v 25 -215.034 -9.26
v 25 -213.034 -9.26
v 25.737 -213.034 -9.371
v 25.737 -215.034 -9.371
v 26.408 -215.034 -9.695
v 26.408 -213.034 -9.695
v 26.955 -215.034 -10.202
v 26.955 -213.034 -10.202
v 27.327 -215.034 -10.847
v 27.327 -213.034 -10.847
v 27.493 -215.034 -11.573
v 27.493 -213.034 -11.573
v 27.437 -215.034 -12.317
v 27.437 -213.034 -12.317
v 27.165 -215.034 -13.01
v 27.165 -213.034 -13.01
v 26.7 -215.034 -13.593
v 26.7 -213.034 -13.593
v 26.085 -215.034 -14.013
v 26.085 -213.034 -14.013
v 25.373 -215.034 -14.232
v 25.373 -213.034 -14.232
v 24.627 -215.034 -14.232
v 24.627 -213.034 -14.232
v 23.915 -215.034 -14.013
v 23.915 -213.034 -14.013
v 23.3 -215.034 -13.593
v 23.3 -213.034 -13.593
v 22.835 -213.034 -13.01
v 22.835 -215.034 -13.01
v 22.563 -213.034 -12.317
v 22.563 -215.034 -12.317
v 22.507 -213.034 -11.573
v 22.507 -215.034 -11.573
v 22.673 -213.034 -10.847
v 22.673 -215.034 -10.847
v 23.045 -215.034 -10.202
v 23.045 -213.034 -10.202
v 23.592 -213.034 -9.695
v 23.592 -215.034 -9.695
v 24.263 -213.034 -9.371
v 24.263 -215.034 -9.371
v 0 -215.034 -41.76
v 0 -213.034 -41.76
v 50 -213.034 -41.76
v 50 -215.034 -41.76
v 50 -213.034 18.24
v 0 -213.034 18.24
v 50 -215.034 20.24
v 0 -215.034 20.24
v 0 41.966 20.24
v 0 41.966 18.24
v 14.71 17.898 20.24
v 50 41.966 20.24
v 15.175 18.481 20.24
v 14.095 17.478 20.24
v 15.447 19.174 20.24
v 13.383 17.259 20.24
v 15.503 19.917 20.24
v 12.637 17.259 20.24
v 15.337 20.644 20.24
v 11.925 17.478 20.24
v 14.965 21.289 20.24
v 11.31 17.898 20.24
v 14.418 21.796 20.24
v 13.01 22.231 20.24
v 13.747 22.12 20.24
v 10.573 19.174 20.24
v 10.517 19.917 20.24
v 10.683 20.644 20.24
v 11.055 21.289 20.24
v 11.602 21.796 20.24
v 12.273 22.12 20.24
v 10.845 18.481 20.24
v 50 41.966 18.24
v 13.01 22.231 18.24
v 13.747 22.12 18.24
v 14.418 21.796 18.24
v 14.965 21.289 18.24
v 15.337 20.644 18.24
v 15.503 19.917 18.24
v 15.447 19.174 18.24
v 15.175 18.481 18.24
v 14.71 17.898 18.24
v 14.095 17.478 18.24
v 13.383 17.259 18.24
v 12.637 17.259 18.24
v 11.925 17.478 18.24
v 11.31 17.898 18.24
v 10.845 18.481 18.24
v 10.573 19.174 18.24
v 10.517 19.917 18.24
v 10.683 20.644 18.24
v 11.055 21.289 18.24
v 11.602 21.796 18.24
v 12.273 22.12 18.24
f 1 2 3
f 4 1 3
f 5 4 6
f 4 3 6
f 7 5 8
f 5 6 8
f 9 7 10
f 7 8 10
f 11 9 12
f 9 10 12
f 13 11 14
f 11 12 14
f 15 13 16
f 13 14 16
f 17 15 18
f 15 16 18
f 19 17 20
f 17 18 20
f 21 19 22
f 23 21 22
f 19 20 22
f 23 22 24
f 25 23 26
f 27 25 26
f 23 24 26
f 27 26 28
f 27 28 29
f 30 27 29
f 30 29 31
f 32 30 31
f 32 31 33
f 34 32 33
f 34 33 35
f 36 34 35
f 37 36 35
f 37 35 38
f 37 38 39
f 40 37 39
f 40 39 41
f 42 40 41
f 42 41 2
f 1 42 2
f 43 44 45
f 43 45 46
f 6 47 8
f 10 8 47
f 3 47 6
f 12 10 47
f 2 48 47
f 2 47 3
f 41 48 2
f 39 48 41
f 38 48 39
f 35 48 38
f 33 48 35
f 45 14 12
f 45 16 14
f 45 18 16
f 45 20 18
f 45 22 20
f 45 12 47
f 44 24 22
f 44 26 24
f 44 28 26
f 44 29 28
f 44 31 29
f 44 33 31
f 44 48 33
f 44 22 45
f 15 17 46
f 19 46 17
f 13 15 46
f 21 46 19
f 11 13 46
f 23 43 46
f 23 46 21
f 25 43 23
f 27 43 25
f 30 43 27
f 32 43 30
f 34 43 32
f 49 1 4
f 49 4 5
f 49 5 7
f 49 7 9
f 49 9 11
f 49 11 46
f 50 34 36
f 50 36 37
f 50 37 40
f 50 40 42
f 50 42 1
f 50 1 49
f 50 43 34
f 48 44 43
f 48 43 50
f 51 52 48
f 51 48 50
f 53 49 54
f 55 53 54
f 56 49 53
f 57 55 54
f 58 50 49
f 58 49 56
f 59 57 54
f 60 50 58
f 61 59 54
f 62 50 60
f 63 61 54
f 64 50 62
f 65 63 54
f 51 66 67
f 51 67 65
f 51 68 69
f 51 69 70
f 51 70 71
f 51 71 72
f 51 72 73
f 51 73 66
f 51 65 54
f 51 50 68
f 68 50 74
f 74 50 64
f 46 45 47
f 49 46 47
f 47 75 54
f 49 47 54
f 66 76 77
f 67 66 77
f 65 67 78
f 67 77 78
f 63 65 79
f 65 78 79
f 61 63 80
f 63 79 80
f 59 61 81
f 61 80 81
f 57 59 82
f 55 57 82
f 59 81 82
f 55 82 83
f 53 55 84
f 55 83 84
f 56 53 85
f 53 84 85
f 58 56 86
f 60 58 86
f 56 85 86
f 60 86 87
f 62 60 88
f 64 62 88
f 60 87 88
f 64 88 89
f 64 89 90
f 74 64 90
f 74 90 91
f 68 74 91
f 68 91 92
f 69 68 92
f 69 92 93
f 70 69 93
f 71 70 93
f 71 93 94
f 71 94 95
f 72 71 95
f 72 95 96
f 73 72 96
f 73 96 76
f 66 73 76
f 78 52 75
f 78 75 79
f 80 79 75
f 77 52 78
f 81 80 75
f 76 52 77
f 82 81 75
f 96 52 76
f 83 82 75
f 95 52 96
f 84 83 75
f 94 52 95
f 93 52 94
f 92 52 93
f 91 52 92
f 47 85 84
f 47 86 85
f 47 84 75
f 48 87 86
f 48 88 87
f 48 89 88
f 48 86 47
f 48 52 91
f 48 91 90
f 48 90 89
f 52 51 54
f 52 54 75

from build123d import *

# Parameters (mm, degrees)
SALIENTE_EXTRUIR1_DEPTH = 50
CROQUIS2_R              = 2.5
CORTAR_EXTRUIR1_DEPTH   = 10
CROQUIS3_R              = 2.5
CORTAR_EXTRUIR2_DEPTH   = 10


with BuildPart() as part:
    # Croquis1 → Saliente-Extruir1 (new body)
    with BuildSketch(Plane(origin=(0, 0, 0), x_dir=(0, 0, -1), z_dir=(1, 0, 0))):
        Polygon((-20.239694924, -215.034421421), (-20.239694924, 41.965578579), (-18.239694924, 41.965578579), (-18.239694924, -213.034421421), (41.760305076, -213.034421421), (41.760305076, -215.034421421), align=None)
    extrude(amount=SALIENTE_EXTRUIR1_DEPTH)

    # Croquis2 → Cortar-Extruir1 (cut)
    with BuildSketch(Plane(origin=(0, -213.034421421, 0), x_dir=(1, 0, 0), z_dir=(0, 1, 0))):
        with Locations(Location((25, 11.760305076, 0), (0, 0, 270))):
            Circle(CROQUIS2_R)
    extrude(amount=-CORTAR_EXTRUIR1_DEPTH, mode=Mode.SUBTRACT)

    # Croquis3 → Cortar-Extruir2 (cut)
    with BuildSketch(Plane(origin=(0, 0, 18.239694924), x_dir=(-1, 0, 0), z_dir=(0, 0, -1))):
        with Locations(Location((-13.01, 19.730578579, 0), (0, 0, 90))):
            Circle(CROQUIS3_R)
    extrude(amount=-CORTAR_EXTRUIR2_DEPTH, mode=Mode.SUBTRACT)


solid = part.part
